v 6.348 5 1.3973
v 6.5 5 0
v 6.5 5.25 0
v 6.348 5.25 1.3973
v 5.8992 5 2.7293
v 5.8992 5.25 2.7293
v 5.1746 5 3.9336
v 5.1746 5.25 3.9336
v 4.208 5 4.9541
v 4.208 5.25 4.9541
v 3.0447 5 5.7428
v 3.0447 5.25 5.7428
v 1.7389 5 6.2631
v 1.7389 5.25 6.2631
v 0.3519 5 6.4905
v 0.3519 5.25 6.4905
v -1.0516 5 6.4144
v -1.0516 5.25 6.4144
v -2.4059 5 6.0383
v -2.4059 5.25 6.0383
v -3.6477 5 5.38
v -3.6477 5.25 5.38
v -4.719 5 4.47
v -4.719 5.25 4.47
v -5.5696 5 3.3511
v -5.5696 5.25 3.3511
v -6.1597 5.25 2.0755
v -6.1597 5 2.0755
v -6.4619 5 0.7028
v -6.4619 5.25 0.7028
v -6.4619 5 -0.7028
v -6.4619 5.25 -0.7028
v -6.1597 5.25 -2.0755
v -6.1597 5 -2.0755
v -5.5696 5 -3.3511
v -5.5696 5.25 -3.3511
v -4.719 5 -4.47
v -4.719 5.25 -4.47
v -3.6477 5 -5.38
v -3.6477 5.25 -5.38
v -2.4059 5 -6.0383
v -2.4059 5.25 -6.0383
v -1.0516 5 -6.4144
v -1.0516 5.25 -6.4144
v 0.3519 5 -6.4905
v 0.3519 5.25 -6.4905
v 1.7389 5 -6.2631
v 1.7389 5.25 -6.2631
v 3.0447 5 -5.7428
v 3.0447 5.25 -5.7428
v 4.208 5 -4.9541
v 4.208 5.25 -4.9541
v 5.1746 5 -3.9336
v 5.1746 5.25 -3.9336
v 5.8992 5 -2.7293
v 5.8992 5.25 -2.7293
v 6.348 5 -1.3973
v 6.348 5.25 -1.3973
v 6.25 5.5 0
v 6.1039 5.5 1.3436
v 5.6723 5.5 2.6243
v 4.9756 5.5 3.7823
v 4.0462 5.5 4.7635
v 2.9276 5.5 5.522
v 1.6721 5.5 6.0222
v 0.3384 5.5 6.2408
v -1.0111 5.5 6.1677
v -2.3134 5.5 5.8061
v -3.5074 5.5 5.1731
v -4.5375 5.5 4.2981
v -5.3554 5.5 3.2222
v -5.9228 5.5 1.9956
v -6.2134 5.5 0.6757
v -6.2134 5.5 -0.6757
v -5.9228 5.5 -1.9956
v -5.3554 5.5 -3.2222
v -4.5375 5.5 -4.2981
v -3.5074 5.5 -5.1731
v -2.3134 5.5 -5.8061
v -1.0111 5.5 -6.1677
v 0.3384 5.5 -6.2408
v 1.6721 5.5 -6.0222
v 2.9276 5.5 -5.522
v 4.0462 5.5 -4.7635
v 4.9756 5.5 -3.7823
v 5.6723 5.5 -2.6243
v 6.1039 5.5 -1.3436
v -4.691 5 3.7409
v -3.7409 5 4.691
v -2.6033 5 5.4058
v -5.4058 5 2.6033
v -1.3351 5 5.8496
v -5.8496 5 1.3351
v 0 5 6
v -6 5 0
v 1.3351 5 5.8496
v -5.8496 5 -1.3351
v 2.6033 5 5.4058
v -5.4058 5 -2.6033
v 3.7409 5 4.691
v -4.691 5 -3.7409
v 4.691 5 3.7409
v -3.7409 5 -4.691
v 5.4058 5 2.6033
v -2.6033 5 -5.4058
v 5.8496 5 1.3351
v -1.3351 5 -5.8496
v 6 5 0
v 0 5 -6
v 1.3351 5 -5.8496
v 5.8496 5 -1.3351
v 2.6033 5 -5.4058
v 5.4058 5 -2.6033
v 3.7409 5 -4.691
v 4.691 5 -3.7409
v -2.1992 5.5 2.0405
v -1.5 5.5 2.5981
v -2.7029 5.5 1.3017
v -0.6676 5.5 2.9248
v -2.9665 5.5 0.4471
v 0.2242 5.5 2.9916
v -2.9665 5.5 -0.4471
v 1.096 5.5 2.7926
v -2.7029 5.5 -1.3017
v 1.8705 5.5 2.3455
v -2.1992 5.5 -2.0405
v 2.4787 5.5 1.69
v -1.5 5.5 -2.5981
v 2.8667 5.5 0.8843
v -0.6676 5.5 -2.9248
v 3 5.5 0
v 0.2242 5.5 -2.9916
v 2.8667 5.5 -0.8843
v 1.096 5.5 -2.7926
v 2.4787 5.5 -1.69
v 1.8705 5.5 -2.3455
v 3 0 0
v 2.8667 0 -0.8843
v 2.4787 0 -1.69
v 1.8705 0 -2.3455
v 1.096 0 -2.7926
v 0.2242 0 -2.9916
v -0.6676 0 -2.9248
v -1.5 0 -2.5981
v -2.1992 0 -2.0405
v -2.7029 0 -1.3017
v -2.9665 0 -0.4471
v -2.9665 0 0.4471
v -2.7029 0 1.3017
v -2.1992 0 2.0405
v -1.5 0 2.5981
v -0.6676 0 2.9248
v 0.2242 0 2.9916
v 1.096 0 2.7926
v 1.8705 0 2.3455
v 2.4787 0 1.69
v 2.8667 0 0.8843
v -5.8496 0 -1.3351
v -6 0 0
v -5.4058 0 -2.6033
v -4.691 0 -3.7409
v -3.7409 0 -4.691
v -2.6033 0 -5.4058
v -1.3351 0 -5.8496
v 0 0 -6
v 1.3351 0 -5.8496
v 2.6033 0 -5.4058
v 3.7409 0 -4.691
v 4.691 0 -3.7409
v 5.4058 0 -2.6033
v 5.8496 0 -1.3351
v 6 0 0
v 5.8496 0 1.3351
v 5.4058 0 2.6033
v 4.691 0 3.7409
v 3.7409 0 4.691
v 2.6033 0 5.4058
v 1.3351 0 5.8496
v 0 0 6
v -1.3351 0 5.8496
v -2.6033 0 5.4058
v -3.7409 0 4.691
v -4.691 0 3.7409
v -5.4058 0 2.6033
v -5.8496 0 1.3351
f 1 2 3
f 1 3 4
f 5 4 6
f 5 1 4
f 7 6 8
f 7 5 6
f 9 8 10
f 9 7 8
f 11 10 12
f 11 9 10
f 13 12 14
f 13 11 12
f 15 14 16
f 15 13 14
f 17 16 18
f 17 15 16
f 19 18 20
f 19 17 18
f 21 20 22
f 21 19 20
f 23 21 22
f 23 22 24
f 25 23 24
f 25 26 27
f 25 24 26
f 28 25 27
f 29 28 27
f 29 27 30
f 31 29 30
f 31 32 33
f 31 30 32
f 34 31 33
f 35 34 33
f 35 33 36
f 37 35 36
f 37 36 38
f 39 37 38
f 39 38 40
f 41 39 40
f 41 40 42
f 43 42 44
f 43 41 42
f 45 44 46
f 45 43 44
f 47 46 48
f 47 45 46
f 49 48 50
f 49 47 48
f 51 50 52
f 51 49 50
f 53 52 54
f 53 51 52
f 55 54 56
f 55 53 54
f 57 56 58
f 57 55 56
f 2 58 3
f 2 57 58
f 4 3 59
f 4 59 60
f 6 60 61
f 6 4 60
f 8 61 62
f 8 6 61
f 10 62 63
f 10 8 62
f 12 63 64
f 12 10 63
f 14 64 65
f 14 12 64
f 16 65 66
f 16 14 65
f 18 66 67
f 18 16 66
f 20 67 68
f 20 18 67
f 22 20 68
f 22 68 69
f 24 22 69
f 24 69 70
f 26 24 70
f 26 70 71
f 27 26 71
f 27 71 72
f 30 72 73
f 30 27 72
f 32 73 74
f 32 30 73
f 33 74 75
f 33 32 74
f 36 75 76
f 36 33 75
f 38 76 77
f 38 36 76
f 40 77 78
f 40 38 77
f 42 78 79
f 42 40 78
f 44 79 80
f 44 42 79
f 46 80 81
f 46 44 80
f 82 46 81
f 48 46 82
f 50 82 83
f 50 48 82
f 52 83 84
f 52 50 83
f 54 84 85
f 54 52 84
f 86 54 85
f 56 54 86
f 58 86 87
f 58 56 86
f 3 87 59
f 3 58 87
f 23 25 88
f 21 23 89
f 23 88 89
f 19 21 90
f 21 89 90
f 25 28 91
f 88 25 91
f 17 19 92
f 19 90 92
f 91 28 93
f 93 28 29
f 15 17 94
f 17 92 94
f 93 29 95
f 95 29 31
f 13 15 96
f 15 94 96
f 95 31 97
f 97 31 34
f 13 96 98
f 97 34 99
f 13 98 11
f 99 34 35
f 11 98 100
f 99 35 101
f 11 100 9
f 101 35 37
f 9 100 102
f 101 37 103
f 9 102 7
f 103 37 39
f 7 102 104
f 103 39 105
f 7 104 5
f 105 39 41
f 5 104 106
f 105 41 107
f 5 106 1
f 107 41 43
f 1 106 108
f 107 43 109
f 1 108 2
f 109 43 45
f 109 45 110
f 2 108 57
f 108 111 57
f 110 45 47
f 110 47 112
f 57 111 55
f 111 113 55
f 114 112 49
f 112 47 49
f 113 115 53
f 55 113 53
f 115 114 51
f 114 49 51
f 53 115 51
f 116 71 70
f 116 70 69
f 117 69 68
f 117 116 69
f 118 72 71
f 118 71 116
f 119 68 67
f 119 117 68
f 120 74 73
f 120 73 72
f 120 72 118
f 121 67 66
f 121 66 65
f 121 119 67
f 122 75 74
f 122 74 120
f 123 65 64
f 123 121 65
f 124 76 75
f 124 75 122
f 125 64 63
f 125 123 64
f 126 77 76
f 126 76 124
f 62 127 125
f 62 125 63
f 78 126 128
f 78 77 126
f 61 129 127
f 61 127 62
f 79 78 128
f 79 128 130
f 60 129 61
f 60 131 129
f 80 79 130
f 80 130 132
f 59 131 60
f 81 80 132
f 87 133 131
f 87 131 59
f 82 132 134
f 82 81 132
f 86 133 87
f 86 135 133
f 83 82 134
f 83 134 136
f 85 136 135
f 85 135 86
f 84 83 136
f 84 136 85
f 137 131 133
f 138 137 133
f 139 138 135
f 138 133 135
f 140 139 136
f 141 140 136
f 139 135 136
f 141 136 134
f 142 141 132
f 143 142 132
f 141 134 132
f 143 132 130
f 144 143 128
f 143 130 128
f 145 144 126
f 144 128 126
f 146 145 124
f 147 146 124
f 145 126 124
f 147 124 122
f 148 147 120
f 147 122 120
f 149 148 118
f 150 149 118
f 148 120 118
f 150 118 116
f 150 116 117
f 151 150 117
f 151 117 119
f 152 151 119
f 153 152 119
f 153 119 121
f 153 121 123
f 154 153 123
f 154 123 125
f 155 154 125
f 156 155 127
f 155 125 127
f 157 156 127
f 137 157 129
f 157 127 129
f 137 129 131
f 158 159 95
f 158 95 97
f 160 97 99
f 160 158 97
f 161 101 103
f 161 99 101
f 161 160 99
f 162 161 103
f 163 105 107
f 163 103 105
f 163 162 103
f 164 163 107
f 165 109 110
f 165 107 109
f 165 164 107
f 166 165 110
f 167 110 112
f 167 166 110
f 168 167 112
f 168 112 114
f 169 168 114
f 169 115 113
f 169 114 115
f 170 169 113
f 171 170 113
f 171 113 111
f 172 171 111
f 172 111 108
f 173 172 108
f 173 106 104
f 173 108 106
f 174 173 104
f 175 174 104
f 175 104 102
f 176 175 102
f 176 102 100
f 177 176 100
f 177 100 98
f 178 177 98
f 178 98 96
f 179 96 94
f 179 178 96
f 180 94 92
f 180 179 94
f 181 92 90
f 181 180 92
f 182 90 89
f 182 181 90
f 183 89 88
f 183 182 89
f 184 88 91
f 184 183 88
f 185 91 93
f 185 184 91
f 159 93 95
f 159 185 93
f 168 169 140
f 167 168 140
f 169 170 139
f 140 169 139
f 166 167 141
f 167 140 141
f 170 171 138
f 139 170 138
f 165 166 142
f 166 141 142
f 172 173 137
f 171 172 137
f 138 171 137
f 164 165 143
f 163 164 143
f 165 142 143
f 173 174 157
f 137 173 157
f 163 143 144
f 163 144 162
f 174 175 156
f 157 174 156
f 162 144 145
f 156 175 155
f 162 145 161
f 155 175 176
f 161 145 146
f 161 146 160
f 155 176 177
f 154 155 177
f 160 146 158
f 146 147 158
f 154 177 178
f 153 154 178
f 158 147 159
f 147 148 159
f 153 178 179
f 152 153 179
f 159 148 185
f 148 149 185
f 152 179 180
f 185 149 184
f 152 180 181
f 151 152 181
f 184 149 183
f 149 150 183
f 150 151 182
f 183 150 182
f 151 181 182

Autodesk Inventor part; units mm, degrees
ref_plane "YZ Plane" through (0, 0, 0) normal (1, 0, 0) x (0, 1, 0)
ref_plane "XZ Plane" through (0, 0, 0) normal (0, 1, 0) x (-1, 0, 0)
ref_plane "XY Plane" through (0, 0, 0) normal (0, 0, 1) x (1, 0, 0)
sketch "Sketch1" plane through (0, 0, 0) normal (0, 1, 0) x (-1, 0, 0)
  circle A0 centre (0, 0) radius 6
  dimension "d0" = 12
extrude "Extrusion1" add sketch "Sketch1" along normal blind 5
sketch "Sketch2" plane through (0, 5, 0) normal (0, 1, 0) x (1, 0, 0)
  circle A0 centre (0, 0) radius 6 projected
  circle A1 centre (0, 0) radius 6.5
  dimension "d3" = 13
extrude "Extrusion2" add sketch "Sketch2" along normal blind 0.5 contours A0 | A1
chamfer "Chamfer1" distance 0.25 angle 45 1 edges at (-6.5, 5.5, 0)
sketch "Sketch3" plane through (0, 5.5, 0) normal (0, 1, 0) x (1, 0, 0)
  circle A0 centre (0, 0) radius 6.25 projected
  circle A1 centre (0, 0) radius 3
  dimension "d9" = 6
extrude "Extrusion3" cut sketch "Sketch3" against normal through all contours A1
properties part number "500-125" material "ABS Plastic"
